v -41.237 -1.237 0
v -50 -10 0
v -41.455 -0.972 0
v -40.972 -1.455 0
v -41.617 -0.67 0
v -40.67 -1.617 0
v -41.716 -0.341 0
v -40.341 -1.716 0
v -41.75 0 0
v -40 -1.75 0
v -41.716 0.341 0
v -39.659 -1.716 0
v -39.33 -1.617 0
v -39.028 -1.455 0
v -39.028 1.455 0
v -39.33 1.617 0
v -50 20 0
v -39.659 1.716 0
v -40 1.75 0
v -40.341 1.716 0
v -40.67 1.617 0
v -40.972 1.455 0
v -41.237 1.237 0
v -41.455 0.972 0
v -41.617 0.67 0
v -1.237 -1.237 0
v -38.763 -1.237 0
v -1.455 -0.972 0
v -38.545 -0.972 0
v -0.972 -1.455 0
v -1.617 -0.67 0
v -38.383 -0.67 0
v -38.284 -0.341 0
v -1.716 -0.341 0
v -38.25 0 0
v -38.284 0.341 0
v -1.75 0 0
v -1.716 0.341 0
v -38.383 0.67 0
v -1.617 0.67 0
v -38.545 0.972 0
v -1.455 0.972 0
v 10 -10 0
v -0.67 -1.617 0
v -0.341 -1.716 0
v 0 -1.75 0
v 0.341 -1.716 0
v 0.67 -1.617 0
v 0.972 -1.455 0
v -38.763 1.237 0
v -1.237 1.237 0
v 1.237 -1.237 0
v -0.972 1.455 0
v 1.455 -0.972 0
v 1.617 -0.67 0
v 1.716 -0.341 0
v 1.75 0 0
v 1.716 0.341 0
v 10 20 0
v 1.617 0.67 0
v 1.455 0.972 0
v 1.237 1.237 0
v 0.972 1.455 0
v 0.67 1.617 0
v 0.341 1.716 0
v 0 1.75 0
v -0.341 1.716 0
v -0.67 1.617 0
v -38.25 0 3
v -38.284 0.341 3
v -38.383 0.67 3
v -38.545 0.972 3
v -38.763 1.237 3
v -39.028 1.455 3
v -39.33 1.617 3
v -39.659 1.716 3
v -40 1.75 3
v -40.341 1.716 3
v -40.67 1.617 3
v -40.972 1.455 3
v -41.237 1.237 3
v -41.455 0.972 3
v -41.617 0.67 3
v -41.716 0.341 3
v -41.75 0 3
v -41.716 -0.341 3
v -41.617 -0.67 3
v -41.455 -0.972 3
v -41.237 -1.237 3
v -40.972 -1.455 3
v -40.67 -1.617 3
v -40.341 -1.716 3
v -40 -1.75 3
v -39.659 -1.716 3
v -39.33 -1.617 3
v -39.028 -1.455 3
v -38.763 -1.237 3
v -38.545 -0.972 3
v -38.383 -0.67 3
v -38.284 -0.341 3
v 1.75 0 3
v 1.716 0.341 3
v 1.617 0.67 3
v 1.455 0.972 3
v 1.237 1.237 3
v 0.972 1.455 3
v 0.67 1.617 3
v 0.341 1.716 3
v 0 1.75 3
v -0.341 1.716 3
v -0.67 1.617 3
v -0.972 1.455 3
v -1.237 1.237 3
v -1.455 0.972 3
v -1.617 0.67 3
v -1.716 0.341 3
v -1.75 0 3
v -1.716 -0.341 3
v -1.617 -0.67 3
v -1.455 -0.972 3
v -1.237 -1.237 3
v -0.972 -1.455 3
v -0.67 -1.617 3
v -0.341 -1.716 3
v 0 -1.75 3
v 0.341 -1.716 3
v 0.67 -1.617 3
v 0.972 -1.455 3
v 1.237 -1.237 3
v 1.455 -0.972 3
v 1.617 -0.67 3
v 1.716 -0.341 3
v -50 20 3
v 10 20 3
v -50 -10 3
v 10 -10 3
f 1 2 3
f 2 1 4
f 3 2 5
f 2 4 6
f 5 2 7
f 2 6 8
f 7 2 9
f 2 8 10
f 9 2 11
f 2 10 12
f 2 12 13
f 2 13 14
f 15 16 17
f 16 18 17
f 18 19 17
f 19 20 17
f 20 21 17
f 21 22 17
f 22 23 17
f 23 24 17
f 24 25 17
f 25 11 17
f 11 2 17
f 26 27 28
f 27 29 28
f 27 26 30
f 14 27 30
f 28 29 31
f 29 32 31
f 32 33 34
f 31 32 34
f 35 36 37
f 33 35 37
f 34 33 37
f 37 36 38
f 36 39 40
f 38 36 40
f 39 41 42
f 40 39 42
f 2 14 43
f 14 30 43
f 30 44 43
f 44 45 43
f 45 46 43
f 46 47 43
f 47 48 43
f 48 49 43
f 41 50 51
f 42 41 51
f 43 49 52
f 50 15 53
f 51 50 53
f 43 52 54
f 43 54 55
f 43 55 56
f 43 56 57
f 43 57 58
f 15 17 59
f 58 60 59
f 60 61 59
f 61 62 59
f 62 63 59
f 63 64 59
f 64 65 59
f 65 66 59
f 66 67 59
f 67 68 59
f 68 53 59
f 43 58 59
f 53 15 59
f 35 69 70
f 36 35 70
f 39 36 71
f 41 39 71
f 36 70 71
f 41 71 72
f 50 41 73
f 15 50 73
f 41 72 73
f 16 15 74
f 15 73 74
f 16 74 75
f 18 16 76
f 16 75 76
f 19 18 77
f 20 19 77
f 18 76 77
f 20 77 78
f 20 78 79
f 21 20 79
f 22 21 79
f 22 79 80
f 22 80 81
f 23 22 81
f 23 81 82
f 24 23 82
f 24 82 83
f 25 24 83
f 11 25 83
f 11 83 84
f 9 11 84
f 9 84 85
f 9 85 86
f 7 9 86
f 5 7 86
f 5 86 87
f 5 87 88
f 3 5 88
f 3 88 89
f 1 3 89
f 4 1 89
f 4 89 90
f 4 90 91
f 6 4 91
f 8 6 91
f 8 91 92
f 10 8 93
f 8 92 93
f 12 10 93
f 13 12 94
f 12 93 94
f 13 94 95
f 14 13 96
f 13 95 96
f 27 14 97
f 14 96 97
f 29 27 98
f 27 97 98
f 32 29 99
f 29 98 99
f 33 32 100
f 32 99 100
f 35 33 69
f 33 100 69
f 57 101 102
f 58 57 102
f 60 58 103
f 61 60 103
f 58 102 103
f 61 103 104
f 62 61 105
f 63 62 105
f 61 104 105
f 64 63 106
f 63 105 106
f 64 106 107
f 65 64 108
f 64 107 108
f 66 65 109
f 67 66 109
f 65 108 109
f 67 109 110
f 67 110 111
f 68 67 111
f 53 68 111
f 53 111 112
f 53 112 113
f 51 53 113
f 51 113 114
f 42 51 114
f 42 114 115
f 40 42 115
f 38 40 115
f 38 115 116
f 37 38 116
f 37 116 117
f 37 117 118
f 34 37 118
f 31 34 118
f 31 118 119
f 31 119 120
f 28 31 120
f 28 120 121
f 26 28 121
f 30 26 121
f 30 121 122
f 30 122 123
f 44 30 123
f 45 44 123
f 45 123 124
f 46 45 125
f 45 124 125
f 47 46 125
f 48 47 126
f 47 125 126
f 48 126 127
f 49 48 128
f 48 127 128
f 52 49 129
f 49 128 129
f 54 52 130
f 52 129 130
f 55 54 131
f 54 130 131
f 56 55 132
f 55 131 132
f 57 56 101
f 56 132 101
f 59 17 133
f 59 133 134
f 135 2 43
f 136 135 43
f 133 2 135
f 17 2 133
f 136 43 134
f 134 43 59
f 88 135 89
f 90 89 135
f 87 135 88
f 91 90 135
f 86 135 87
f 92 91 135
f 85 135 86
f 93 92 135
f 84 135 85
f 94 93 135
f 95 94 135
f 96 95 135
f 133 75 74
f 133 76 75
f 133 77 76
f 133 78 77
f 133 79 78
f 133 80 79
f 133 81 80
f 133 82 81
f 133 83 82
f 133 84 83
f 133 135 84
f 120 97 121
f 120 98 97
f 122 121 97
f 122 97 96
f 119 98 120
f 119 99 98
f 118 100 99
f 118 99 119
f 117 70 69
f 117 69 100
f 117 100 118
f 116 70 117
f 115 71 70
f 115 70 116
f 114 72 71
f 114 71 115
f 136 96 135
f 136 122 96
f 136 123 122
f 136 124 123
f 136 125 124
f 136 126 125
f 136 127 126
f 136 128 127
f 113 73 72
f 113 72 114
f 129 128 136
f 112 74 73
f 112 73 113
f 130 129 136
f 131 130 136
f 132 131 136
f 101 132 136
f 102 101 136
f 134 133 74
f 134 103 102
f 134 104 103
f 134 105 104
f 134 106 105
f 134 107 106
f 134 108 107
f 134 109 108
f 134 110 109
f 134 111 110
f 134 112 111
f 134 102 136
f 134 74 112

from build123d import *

# Parameters (mm, degrees)
SKETCH_1_W          = 60
SKETCH_1_H          = 30
EXTRUDE_1_DEPTH     = 3
SKETCH_2_R          = 1.75
CUT_EXTRUDE_2_DEPTH = 54.935146241


with BuildPart() as part:
    # 草圖1 → 伸長1 (new body)
    with BuildSketch(Plane.XY):
        with Locations((-20, 5)):
            Rectangle(SKETCH_1_W, SKETCH_1_H)
    extrude(amount=EXTRUDE_1_DEPTH)

    # 草圖2 → 伸長2 (cut, through all)
    with BuildSketch(Plane.XY.offset(3)):
        with Locations((-40, 0)):
            Circle(SKETCH_2_R)
        Circle(SKETCH_2_R)
    extrude(amount=-CUT_EXTRUDE_2_DEPTH, mode=Mode.SUBTRACT)


solid = part.part
